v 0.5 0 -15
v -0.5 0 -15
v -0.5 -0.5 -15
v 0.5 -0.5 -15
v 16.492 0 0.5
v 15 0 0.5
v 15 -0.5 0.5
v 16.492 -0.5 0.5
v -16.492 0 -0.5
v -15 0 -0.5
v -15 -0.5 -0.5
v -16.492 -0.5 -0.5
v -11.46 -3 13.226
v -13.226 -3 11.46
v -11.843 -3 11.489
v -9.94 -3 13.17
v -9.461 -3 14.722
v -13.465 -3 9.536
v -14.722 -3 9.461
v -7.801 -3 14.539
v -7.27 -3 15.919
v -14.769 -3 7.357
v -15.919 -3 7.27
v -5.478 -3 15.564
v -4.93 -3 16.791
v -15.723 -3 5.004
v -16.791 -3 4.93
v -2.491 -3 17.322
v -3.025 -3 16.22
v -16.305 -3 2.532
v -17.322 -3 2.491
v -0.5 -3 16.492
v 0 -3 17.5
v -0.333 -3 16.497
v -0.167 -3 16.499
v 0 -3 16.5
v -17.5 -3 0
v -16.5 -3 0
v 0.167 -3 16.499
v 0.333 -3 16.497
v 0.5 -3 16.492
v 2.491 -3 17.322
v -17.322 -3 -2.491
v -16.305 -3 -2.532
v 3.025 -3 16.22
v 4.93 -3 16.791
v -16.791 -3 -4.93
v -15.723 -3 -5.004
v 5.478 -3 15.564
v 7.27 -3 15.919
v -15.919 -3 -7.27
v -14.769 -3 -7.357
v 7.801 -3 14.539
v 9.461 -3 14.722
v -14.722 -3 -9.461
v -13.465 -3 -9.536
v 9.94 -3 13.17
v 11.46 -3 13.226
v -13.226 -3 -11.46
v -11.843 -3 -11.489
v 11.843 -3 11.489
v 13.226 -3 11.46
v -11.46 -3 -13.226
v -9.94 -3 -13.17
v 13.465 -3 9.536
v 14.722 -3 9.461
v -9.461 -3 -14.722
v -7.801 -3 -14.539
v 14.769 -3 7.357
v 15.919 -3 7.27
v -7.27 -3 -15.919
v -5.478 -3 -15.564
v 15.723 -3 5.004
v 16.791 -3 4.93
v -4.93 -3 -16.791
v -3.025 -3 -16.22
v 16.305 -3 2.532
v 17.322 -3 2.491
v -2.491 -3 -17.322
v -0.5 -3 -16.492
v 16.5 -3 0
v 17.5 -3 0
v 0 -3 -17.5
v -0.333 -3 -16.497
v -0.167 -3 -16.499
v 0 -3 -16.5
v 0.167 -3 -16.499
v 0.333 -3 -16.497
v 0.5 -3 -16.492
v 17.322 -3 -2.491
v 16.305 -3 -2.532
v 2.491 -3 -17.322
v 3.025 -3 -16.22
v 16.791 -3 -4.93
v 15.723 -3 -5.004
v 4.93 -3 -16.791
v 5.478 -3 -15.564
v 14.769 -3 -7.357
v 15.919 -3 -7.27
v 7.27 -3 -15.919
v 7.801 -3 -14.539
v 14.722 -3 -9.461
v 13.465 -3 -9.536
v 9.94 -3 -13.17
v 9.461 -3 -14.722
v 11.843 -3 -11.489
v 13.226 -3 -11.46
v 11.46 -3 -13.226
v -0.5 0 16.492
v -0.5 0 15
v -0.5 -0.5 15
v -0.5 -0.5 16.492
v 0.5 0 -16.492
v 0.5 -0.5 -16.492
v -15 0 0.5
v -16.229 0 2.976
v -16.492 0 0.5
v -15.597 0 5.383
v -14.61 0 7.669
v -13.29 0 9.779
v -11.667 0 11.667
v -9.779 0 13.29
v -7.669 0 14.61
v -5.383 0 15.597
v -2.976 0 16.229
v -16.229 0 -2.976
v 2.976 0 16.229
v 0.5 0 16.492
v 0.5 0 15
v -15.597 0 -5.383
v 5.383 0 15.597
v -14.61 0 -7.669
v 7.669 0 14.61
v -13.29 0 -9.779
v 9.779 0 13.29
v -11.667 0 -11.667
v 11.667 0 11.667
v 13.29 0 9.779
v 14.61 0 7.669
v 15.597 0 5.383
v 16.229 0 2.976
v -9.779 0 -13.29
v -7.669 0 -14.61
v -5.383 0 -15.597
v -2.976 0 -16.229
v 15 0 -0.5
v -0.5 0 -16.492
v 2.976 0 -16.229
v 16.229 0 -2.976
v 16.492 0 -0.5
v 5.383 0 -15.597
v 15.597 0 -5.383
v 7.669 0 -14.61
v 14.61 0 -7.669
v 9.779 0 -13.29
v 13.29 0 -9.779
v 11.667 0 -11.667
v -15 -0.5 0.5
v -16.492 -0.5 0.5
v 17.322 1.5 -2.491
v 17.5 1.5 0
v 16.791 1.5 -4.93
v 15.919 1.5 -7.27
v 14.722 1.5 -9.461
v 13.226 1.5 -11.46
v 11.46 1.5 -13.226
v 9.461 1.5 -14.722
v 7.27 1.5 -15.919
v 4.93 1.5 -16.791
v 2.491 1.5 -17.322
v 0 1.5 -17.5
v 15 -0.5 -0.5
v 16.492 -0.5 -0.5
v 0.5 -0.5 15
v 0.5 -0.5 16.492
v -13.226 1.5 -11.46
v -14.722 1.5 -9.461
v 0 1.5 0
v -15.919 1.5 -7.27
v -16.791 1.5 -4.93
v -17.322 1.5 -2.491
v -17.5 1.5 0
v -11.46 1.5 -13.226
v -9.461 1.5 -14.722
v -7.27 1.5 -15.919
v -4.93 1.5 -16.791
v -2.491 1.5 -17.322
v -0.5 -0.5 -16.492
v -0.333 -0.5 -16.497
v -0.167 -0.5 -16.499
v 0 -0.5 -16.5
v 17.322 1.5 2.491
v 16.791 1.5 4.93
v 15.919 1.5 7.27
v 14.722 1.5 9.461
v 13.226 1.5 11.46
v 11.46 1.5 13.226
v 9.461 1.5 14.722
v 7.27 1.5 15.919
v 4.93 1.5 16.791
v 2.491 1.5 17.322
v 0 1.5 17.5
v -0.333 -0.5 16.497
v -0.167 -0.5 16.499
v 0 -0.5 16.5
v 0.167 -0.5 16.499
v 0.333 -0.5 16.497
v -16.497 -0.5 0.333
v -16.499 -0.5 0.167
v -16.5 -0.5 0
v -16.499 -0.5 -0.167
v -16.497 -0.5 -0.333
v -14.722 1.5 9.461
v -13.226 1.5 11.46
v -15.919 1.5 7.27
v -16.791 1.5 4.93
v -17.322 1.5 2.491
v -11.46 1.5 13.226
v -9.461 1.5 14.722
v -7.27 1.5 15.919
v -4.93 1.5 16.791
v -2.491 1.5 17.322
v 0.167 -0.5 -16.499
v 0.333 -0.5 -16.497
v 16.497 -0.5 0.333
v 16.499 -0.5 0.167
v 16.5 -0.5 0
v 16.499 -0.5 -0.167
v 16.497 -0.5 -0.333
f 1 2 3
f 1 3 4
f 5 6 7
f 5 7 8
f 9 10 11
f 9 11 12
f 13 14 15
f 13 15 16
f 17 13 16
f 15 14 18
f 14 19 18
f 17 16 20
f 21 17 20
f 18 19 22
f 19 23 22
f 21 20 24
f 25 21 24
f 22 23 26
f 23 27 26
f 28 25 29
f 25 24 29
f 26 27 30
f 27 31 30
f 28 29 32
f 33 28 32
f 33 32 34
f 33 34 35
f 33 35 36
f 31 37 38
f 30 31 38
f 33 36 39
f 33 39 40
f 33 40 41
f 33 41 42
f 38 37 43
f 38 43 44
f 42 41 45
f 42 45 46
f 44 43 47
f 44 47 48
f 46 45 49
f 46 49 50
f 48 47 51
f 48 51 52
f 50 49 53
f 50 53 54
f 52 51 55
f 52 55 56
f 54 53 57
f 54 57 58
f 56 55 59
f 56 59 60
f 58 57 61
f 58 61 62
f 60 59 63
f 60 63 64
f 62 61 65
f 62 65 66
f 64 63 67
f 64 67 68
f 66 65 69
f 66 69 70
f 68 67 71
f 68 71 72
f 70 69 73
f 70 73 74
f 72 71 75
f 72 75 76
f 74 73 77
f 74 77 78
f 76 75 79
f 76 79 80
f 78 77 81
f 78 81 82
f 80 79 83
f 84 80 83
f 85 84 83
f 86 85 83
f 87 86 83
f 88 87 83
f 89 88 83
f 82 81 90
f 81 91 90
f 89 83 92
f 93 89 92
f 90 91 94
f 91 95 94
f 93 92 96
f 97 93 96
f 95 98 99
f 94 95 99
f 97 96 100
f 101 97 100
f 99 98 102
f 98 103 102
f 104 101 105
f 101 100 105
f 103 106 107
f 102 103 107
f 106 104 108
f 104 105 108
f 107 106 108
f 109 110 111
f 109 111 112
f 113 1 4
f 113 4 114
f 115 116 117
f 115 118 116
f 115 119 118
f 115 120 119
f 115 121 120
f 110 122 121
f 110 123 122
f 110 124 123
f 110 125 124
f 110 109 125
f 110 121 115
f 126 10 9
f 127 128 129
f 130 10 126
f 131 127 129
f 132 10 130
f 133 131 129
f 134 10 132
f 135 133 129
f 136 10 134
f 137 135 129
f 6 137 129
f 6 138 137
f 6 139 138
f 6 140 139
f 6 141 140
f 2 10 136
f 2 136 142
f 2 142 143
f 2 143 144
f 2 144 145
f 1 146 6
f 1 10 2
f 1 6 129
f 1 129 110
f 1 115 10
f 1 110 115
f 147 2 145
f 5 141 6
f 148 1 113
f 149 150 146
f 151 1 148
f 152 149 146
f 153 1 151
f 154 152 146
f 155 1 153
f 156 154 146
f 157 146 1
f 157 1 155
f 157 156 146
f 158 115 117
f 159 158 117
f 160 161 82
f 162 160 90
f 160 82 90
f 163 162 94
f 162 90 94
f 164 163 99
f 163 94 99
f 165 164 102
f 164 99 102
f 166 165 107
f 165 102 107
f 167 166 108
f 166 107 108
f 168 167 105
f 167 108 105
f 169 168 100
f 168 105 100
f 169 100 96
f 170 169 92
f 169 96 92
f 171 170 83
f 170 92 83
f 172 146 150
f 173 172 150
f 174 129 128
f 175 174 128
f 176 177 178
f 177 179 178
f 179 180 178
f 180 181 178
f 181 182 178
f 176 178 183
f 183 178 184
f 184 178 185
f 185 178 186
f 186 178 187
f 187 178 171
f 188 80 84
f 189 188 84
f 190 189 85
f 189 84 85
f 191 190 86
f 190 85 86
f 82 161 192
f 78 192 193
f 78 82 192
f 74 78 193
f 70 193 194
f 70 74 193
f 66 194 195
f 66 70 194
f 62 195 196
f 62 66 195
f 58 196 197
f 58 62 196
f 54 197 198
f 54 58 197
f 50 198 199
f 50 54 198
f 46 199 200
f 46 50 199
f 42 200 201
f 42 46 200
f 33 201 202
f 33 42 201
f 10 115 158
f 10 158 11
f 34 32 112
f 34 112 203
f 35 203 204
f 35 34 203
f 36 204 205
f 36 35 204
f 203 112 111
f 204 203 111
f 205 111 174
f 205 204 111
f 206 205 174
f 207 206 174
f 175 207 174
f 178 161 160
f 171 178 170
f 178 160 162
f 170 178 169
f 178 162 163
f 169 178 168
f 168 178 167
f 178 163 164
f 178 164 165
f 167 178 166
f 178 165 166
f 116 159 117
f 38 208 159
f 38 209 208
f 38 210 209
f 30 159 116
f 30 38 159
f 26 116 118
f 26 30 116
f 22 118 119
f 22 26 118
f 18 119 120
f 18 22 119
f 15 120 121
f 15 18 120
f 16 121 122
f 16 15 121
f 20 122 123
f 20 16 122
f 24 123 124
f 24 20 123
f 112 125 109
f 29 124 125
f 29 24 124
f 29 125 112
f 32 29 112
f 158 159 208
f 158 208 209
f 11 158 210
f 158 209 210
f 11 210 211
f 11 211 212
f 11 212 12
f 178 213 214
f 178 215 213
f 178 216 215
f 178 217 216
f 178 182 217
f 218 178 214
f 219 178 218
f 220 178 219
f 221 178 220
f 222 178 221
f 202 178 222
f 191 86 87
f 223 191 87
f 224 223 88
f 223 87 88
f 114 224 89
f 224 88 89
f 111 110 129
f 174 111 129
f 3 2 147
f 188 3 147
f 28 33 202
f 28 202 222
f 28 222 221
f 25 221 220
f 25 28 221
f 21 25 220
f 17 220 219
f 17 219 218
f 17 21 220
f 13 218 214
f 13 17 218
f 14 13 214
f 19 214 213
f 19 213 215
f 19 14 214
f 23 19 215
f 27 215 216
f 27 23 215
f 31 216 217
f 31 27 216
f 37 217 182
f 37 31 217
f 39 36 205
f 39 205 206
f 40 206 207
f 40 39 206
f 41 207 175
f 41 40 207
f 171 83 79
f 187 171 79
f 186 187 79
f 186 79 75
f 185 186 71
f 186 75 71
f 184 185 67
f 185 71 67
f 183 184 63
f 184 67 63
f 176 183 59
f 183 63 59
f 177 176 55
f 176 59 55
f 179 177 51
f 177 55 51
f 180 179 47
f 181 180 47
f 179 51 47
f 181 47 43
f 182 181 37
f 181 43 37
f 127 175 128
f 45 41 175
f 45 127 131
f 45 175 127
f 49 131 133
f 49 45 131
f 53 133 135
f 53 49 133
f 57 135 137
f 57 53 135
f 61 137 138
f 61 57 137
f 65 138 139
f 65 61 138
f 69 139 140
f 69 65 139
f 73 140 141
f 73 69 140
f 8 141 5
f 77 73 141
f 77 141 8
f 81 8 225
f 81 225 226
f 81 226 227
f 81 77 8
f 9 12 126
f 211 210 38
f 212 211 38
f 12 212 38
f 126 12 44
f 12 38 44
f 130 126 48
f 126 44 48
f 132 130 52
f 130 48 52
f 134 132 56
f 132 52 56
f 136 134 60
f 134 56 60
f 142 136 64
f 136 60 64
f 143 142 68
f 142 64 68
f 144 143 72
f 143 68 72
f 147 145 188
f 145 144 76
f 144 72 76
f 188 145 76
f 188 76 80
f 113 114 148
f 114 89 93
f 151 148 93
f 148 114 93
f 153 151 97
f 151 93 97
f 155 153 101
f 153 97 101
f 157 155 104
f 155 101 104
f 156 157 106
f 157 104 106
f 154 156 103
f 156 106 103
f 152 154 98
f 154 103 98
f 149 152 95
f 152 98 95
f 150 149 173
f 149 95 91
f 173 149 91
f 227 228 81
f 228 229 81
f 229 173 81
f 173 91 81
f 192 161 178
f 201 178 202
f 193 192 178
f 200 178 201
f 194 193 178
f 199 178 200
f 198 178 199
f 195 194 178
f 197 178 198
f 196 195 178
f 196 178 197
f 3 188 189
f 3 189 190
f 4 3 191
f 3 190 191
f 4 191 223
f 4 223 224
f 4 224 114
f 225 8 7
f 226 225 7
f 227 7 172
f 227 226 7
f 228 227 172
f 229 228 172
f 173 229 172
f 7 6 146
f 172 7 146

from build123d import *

# Parameters (mm, degrees)
SKETCH1_R             = 17.5
BOSS_EXTRUDE1_DEPTH   = 1.5
SKETCH3_W             = 1
SKETCH3_H             = 1.5
BOSS_EXTRUDE3_DEPTH   = 0.5
BOSS_EXTRUDE4_START   = 3
SKETCH3_4_R           = 17.5
BOSS_EXTRUDE4_DEPTH   = 3
BOSS_EXTRUDE6_DEPTH   = 2.5
BODY_MOVE_COPY1_ANGLE = 90


with BuildPart() as part:
    # Sketch1 → Boss-Extrude1 (new body)
    with BuildSketch(Plane(origin=(0, 0, 0), x_dir=(1, 0, 0), z_dir=(0, 1, 0))):
        with Locations(Location((0, 0, 0), (0, 0, 270))):
            Circle(SKETCH1_R)
    extrude(amount=BOSS_EXTRUDE1_DEPTH)

    # Sketch3 → Boss-Extrude3 (add)
    with BuildSketch(Plane.XZ):
        with Locations((0, 15.75)):
            Rectangle(SKETCH3_W, SKETCH3_H)
    extrude(amount=BOSS_EXTRUDE3_DEPTH)

    # Sketch3<4> → Boss-Extrude4 (add)
    with BuildSketch(Plane.XZ.offset(BOSS_EXTRUDE4_START)):
        with Locations(Location((0, 0, 0), (0, 0, 270))):
            Circle(SKETCH3_4_R)
        with BuildLine():
            Line((-0.5, 16.5), (0.5, 16.5))
            Line((0.5, 16.5), (0.5, 16.492422502))
            ThreePointArc((0.5, 16.492422502), (0, -16.5), (-0.5, 16.492422502))
            Line((-0.5, 16.492422502), (-0.5, 16.5))
        make_face(mode=Mode.SUBTRACT)
    extrude(amount=-BOSS_EXTRUDE4_DEPTH)

    # Sketch4 → Boss-Extrude6 (add)
    with BuildSketch(Plane.XZ.offset(3)):
        with BuildLine():
            Line((-0.5, 16.5), (-0.5, 16.492422502))
            ThreePointArc((-0.5, 16.492422502), (-0.250028708, 16.498105517), (0, 16.5))
            Line((0, 16.5), (-0.5, 16.5))
        make_face()
        with BuildLine():
            Line((0.5, 16.5), (0, 16.5))
            ThreePointArc((0, 16.5), (0.250028708, 16.498105517), (0.5, 16.492422502))
            Line((0.5, 16.492422502), (0.5, 16.5))
        make_face()
    extrude(amount=-BOSS_EXTRUDE6_DEPTH)

    # Split2
    split(bisect_by=Plane(origin=(0, 0, 0), x_dir=(-1, 0, 0), z_dir=(0, 0, -1)), keep=Keep.BOTTOM)

    # Mirror1: part across plane


with BuildPart() as part_1:
    add(part.part)
    add(part.part.mirror(Plane(origin=(0, 0, 0), x_dir=(1, 0, 0), z_dir=(0, 0, -1))))


with BuildPart() as body_2:
    # Body-Move/Copy1: copy of part
    add(part_1.part.rotate(Axis((0, 0, 0), (0, 1, 0)), BODY_MOVE_COPY1_ANGLE))


with BuildPart() as part_2:
    add(part_1.part)

    # Combine1: union body 2
    add(body_2.part)


solid = part_2.part
